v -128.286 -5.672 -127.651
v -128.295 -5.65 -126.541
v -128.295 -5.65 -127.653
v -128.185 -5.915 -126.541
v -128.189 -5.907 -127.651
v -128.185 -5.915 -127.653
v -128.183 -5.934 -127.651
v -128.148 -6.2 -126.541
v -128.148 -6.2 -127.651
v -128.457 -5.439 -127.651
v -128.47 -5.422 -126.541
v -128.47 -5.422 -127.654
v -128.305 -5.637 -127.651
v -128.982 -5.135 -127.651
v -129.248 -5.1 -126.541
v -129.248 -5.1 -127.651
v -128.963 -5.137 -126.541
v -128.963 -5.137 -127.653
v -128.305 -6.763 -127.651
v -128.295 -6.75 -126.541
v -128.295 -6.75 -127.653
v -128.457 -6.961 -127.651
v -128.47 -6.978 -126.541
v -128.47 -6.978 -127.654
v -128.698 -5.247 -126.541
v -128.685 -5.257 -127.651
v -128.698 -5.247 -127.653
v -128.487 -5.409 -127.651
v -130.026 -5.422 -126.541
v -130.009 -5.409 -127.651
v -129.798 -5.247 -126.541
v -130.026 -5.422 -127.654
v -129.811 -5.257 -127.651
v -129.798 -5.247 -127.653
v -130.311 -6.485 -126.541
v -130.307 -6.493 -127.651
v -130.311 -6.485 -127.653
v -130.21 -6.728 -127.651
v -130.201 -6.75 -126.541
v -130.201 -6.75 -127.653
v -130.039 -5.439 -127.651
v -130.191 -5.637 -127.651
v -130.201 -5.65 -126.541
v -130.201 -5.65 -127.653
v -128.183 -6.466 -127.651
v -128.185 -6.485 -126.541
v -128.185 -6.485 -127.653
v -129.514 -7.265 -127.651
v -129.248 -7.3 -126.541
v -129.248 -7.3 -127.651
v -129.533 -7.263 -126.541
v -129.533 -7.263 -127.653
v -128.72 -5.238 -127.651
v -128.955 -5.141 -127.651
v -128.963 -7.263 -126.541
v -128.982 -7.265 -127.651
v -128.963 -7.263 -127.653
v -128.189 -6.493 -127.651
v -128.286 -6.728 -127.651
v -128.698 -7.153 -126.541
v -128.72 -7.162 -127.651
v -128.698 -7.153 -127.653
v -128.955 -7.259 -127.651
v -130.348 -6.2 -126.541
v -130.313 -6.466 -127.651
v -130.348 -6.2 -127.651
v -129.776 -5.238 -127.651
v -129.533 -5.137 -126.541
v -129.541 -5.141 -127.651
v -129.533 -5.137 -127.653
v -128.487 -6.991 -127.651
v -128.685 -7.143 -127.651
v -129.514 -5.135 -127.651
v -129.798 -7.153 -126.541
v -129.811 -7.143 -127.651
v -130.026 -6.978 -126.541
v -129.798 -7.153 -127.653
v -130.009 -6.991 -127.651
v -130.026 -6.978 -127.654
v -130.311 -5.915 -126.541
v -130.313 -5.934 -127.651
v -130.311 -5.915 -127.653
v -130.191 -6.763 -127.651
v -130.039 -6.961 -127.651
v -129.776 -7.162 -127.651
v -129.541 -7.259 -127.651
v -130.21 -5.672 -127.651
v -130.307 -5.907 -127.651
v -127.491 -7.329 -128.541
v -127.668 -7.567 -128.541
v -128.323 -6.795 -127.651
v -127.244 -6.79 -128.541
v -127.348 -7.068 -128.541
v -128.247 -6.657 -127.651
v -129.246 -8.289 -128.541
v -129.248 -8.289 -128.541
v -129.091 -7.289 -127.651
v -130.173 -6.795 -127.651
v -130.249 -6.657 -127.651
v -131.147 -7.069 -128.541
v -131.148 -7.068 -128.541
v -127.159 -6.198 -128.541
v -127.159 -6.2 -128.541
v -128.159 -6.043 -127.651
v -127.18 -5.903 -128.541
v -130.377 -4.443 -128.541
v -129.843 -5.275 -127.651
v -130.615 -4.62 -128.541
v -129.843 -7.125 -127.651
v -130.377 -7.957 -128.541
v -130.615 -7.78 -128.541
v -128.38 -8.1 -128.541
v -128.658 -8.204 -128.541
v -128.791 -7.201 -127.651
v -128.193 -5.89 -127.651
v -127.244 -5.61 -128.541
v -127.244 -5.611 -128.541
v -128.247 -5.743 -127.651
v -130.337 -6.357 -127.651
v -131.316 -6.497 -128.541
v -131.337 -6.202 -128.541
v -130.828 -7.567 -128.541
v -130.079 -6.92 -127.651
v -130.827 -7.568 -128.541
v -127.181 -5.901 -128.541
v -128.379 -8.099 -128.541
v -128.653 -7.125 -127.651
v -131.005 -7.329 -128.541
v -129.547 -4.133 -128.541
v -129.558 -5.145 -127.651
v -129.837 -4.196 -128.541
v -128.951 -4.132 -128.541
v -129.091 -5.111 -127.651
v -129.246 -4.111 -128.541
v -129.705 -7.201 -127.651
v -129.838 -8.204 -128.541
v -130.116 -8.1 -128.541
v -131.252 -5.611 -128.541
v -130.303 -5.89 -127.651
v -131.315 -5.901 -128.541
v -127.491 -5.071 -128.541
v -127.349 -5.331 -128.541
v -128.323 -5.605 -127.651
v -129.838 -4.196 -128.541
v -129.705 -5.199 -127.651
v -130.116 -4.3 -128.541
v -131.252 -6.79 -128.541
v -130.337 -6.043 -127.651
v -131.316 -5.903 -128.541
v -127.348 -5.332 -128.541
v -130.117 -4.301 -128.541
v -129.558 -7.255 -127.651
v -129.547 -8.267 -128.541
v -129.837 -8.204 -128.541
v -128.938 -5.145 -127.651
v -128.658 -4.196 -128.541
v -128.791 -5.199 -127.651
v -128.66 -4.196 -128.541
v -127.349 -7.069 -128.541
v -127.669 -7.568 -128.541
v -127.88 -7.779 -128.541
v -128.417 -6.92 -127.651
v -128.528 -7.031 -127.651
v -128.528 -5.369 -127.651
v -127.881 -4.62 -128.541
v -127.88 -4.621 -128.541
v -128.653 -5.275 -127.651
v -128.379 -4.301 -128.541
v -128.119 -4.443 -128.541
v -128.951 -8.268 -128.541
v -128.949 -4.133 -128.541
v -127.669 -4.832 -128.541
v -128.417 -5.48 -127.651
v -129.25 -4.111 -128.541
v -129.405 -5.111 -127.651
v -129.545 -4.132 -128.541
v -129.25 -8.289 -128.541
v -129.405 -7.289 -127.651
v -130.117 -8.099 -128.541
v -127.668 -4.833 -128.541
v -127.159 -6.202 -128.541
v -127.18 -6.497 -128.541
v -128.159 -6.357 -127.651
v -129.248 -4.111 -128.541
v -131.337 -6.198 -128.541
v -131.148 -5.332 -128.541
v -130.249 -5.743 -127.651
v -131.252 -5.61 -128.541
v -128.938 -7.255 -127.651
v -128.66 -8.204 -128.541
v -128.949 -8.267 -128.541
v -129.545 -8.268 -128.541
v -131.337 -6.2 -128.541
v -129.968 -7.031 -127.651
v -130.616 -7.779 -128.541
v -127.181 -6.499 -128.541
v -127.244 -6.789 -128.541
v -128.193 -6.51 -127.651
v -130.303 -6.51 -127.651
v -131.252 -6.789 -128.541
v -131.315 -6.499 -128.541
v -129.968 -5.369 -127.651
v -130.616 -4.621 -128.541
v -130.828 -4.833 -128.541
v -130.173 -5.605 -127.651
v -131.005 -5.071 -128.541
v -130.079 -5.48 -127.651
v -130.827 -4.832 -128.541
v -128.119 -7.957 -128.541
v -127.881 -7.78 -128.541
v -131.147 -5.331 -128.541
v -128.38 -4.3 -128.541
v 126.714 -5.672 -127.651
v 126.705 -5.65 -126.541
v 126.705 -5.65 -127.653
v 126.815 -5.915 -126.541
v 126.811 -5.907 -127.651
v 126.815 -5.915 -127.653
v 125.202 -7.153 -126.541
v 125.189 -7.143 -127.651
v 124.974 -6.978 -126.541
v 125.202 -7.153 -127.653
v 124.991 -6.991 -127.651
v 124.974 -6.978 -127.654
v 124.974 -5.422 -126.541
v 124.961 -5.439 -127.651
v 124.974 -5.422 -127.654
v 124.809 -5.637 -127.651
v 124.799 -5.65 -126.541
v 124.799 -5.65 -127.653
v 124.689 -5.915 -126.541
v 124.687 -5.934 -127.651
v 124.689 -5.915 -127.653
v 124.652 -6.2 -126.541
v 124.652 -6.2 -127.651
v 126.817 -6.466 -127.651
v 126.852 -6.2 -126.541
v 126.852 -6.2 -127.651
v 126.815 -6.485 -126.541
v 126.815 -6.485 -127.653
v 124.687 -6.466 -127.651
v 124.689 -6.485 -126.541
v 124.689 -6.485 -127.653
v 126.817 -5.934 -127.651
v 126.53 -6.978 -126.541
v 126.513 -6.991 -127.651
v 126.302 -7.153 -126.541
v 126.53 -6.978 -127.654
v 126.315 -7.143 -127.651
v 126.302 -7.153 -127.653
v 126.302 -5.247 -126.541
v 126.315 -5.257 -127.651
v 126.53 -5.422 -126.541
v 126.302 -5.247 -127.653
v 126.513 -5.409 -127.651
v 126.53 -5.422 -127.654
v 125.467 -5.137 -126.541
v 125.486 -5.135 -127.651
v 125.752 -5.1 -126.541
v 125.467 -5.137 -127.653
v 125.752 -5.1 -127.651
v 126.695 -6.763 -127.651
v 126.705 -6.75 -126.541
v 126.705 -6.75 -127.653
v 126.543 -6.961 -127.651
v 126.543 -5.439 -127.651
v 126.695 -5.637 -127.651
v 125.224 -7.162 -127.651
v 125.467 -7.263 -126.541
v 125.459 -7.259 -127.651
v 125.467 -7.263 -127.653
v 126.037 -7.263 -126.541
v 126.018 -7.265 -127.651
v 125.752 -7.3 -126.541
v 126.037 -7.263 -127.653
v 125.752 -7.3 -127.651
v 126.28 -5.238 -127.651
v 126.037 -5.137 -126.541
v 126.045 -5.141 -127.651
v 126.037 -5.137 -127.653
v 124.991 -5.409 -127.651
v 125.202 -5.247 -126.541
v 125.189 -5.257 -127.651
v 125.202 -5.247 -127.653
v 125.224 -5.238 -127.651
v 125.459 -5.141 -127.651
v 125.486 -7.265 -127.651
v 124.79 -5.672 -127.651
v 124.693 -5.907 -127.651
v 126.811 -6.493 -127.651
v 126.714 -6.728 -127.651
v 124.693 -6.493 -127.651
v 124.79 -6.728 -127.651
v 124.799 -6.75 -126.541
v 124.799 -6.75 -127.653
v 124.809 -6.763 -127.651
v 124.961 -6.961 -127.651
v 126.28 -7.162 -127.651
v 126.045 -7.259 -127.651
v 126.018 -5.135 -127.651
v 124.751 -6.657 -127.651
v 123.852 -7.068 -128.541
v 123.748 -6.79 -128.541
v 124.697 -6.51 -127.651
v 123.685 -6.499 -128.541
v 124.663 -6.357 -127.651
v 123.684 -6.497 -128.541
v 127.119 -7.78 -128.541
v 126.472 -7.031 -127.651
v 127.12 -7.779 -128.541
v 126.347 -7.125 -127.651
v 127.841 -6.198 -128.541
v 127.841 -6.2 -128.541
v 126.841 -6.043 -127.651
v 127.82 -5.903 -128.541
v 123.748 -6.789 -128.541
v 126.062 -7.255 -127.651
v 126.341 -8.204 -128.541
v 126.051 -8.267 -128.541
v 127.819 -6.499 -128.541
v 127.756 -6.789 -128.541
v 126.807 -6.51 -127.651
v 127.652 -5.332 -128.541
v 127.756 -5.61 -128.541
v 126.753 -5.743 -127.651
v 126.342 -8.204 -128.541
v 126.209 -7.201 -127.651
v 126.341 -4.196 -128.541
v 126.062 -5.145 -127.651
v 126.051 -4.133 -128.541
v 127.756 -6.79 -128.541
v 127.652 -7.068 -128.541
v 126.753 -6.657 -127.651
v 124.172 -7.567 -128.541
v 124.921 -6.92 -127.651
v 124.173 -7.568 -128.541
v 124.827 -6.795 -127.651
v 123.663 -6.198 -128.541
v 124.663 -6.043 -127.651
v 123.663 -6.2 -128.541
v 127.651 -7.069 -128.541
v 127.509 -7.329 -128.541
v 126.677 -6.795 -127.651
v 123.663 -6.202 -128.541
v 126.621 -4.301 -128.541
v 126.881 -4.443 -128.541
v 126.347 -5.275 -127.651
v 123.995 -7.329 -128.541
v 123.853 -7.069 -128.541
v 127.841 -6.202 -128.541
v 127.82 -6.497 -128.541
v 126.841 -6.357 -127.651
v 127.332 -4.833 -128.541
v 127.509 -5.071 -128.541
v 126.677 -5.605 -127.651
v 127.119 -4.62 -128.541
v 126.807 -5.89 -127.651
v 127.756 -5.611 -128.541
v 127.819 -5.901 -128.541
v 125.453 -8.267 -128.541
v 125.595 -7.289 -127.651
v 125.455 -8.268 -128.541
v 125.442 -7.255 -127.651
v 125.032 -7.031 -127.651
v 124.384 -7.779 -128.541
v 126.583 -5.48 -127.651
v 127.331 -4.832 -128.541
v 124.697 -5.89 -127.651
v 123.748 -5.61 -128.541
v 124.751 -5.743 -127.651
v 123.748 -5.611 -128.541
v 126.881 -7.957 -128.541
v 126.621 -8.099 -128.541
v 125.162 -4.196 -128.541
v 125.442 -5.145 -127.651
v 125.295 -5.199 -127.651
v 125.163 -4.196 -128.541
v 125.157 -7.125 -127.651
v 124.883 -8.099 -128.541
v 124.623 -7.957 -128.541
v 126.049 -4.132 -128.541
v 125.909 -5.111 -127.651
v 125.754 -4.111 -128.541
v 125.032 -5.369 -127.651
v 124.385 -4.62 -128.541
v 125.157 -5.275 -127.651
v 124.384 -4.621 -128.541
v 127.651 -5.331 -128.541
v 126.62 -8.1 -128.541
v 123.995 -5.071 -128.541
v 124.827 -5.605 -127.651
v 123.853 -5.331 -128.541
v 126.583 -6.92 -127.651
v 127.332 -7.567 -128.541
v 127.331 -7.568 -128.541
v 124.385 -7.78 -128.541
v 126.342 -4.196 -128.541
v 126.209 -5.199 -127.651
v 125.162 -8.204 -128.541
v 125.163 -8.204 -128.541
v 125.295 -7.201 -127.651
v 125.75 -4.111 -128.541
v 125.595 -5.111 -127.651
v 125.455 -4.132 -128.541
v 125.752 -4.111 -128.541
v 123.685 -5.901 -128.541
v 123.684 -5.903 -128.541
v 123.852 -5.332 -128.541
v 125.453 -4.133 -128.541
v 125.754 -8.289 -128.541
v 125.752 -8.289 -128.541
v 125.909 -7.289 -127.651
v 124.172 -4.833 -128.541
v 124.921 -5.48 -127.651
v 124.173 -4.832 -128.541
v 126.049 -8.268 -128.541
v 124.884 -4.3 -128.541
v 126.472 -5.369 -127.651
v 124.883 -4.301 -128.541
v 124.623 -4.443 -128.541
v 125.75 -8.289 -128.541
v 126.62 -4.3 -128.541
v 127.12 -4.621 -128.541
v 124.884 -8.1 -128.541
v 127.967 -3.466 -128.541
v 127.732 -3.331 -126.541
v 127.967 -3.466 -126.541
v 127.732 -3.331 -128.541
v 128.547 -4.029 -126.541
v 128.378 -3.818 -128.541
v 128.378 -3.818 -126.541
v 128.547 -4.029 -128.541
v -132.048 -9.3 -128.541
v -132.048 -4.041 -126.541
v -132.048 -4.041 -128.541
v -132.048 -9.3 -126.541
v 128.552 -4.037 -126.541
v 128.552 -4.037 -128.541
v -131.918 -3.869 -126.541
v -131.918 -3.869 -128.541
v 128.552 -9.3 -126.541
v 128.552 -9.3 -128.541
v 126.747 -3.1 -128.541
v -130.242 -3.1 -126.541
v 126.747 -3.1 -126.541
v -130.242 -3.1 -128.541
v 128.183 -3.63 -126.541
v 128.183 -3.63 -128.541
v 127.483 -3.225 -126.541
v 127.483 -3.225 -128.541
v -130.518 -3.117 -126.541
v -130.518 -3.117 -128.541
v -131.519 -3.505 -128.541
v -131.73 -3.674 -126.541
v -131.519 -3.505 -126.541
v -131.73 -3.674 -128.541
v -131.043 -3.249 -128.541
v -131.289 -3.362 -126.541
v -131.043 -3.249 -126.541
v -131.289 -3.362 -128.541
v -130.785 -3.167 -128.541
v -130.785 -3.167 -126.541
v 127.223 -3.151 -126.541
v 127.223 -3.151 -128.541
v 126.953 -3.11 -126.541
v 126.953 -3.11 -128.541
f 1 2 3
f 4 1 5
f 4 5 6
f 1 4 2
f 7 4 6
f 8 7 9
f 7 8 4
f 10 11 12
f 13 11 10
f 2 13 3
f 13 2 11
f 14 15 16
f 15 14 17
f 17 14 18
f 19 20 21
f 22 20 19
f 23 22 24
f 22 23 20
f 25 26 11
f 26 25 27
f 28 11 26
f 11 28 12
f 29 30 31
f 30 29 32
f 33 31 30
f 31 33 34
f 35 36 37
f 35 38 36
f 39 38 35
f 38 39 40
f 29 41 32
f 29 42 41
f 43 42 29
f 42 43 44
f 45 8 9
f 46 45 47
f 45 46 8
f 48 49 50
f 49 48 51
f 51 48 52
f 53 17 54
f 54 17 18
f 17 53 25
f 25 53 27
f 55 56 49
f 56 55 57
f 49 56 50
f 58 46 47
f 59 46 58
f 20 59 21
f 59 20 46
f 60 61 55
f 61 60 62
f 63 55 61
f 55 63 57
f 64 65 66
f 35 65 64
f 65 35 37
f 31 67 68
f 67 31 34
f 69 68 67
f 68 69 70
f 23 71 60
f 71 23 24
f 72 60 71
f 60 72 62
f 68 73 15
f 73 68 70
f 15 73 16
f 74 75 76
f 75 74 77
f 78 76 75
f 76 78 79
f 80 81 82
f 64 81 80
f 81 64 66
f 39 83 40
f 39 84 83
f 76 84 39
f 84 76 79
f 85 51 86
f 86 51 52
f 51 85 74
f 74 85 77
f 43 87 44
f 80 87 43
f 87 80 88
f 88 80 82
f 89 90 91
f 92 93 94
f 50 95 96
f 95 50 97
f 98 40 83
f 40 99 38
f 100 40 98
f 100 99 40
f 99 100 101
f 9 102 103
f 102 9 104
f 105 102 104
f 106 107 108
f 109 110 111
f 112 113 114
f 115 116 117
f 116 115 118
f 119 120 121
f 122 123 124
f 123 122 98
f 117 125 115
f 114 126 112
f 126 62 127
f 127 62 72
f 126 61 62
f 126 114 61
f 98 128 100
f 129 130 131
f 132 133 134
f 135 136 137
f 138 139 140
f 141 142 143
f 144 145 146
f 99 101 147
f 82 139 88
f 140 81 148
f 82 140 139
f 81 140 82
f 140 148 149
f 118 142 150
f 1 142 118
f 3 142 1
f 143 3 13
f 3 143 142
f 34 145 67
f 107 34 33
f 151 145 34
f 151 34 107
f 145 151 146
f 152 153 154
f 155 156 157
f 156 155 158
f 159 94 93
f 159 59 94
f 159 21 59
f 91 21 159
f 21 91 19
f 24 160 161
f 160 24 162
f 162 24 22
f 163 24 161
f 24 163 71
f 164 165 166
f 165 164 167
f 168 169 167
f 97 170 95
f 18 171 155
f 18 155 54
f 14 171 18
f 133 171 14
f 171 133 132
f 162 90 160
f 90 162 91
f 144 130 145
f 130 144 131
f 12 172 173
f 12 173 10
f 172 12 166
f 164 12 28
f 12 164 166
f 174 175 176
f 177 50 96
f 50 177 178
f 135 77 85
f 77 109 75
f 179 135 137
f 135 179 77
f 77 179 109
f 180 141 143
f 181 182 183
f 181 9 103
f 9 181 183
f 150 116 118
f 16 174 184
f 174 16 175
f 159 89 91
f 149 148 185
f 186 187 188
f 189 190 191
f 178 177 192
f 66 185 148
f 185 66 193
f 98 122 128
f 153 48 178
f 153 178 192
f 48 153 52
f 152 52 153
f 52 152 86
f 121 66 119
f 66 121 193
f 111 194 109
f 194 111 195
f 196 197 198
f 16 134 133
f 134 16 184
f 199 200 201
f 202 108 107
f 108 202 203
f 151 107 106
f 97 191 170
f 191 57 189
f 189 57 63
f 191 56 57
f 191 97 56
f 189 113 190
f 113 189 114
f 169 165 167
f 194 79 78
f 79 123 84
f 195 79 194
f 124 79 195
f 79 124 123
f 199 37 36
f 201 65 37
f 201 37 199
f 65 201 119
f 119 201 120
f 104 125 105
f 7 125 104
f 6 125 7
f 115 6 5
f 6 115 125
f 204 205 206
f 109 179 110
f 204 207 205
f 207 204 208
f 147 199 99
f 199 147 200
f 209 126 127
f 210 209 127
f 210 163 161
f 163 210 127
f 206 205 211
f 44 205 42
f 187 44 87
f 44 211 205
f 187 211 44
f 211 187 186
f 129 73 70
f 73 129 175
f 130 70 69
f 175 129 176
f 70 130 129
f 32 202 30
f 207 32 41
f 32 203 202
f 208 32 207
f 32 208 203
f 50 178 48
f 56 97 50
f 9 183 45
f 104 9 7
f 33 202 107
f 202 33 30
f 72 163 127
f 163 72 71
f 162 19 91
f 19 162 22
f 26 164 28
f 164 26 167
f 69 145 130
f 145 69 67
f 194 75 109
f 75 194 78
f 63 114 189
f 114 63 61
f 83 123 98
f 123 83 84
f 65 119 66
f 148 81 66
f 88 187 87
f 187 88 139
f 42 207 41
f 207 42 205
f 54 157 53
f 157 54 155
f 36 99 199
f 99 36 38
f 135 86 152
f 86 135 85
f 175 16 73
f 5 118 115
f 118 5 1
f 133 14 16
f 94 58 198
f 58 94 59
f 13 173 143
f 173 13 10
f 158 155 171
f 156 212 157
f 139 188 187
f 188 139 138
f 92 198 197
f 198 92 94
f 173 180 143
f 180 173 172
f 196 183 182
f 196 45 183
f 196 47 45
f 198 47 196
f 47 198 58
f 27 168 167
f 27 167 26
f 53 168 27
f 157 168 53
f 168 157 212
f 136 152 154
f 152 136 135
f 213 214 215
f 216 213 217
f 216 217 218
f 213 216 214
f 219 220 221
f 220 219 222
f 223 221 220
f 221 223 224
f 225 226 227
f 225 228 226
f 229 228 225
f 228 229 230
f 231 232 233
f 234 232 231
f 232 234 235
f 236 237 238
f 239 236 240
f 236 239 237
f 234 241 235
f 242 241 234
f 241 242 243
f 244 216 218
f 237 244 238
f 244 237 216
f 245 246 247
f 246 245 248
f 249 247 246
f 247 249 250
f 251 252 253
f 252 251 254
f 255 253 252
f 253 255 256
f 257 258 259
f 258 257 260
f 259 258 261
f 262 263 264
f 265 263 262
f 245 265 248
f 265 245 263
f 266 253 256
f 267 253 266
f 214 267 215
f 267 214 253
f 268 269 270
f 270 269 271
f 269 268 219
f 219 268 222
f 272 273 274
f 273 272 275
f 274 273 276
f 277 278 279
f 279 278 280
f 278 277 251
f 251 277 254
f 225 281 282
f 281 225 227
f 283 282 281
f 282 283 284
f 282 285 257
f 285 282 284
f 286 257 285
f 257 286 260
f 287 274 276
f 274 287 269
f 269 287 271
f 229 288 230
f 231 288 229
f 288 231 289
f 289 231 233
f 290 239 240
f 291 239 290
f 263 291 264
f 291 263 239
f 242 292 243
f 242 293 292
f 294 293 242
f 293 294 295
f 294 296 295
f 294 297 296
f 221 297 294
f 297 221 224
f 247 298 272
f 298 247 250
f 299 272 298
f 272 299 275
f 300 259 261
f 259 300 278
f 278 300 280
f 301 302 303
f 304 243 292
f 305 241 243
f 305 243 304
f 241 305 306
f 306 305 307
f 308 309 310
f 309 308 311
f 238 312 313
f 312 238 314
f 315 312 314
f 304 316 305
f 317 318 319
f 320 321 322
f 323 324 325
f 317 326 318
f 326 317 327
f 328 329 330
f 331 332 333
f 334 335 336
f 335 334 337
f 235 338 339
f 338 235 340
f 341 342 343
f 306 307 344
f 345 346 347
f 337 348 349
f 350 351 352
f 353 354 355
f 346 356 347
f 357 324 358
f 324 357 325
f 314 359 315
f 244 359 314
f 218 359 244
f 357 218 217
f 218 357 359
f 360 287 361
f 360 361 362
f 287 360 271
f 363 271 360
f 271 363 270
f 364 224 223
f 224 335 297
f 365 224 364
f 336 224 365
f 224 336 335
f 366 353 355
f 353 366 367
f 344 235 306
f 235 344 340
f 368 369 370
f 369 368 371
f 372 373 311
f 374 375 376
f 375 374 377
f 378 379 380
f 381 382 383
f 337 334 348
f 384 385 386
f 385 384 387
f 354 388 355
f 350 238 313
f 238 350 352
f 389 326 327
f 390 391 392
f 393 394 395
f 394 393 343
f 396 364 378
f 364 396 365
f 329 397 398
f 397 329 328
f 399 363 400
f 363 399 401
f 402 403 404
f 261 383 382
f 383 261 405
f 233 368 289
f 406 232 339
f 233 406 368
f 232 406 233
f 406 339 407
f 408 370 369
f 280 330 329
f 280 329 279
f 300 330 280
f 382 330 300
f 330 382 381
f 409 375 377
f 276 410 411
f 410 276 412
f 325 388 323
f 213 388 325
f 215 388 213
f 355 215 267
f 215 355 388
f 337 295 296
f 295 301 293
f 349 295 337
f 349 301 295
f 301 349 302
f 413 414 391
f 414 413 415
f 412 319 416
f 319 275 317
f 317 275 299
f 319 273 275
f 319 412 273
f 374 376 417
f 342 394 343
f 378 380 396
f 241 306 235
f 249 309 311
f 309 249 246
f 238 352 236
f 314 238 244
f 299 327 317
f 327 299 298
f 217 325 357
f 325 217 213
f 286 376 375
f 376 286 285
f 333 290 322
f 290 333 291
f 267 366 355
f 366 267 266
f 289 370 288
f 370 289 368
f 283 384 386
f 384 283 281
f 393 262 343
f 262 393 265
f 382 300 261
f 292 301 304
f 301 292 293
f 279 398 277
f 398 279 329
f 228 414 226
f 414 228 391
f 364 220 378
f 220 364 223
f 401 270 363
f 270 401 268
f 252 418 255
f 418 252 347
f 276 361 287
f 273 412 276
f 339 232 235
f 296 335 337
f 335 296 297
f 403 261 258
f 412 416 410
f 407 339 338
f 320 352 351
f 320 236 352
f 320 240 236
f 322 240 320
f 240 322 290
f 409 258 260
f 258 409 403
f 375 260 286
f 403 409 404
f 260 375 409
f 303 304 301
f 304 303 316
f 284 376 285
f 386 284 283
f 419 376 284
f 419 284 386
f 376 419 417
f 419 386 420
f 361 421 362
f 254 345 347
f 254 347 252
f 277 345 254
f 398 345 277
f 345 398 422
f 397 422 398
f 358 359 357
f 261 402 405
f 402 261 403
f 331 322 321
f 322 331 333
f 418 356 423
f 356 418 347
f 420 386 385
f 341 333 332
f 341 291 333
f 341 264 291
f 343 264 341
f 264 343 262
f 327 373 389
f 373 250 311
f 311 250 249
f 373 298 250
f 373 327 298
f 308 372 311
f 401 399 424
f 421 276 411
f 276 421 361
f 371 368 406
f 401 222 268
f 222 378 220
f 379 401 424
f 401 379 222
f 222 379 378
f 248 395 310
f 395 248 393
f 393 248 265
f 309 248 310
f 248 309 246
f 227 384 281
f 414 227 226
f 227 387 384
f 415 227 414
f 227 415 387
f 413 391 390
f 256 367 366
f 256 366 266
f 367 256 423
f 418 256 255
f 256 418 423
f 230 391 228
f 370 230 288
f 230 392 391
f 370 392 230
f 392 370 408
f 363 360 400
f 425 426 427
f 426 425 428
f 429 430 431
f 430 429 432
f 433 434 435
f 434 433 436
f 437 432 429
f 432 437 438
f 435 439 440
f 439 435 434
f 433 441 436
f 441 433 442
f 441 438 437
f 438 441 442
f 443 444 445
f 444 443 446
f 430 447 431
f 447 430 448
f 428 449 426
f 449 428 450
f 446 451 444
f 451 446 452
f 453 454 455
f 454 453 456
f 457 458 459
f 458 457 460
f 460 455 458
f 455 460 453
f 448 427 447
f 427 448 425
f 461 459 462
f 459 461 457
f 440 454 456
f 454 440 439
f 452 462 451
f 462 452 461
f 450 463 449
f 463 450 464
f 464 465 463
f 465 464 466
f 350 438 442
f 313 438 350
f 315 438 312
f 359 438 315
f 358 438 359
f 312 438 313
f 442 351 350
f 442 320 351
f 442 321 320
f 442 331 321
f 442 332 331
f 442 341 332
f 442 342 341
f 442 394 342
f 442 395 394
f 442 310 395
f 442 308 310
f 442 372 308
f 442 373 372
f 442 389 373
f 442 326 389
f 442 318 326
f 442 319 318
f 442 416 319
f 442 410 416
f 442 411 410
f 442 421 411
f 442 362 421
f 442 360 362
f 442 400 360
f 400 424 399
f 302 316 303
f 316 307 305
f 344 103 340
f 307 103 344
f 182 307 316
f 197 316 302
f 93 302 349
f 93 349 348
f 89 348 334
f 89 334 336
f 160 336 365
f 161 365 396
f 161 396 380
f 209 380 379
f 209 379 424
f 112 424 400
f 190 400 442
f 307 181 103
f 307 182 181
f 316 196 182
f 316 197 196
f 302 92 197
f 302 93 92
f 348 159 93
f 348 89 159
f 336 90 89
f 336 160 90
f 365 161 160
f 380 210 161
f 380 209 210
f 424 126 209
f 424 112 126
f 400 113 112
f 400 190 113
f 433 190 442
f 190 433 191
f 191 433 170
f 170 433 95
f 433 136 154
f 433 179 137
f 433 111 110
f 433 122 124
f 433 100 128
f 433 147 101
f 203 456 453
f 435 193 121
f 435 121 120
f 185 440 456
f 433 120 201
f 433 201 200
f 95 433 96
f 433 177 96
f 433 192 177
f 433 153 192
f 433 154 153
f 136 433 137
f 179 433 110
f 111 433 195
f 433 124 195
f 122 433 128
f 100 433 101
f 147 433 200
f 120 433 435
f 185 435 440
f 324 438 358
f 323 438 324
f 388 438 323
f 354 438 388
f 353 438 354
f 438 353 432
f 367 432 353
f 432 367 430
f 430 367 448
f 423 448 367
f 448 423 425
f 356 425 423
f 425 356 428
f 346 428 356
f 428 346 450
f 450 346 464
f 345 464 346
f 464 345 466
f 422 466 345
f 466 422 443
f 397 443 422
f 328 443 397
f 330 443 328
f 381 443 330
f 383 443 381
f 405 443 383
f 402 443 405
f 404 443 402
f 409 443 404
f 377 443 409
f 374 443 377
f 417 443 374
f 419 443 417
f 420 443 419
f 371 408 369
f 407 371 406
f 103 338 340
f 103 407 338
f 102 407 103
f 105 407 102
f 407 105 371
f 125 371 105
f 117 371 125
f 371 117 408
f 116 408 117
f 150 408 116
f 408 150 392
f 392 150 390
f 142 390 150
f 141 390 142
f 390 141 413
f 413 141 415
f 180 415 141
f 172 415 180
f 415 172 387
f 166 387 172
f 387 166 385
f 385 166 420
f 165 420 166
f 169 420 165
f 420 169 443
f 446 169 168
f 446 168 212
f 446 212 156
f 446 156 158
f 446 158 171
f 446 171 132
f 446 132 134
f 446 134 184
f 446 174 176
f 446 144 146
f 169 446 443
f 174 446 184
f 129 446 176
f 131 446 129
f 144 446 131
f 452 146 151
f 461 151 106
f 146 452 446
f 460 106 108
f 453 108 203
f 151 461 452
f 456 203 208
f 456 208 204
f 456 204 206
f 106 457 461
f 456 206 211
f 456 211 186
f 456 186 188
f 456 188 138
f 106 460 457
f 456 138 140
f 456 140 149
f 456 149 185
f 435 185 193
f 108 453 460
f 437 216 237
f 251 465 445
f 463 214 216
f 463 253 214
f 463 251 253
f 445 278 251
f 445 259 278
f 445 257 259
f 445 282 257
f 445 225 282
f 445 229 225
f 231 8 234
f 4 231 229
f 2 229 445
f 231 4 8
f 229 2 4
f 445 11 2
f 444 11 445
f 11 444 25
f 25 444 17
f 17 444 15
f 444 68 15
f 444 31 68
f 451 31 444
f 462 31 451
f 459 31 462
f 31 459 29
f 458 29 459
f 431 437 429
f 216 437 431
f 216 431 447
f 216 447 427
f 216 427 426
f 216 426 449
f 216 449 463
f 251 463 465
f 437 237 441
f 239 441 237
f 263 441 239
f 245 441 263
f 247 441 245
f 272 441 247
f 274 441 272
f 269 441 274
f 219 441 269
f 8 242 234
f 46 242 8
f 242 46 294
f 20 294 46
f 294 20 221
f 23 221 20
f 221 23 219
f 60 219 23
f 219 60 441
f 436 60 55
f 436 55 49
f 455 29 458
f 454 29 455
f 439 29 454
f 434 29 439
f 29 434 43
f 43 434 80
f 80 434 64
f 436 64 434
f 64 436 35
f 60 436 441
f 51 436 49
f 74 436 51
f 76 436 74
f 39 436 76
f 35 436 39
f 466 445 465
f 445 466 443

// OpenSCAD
// file: layout.scad
// Bass: what all the bass's parts share. Taken from the example (ref/: the earlier
// BassCase) [given]: only the key arrangement and the hand plate's flat middle part.
//
// Frame: x along the rows, y from the hand plate towards the back, z up.

// --- keys: the example's arrangement
pitch    = 20;
rows_y   = [0, 16];              // front, back
rows_x0  = [-80, -70];           // first key of each row; 9 per row [given: 2 x 9]: the
n_row    = 9;                    //   example's 8 + 8, its half-closed front-left well and an added x = 90
cap_top  = [11, 21];             // cap tops at rest: the example's short and tall keys

// --- the discant's mechanism (switch/button.scad): the felt lands on a 1.2 cover on the board
cover_t  = 1.2;
pcb_t    = 1.6;
cu_t     = 0.035;
stroke   = 2.965;
cap_above = cover_t + stroke + 1 + 2;          // board top to cap top at rest: cover, stroke, felt, cap
board_top = [for (c = cap_top) c - cap_above]; // 3.835, 13.835: the back row 10 higher
board_z  = [for (t = board_top) t - cu_t - pcb_t / 2];
cover_top = [for (t = board_top) t + cover_t];

// --- the hand plate: the example's flat middle part, half as wide [given]
plate_w  = 263 / 2;
plate_y  = [-12.5, -9.5];        // the front wall, 3 thick; the hand presses on y = -12.5
plate_h  = 0.75 * (166 + cover_top[0]);   // the example's height (z -166 to the front cover) less 25 % [given]
plate_z  = [cover_top[0] - plate_h, cover_top[0]];   // flush with the front cover at the top

gap      = 0.1;                  // housing to the boards' undersides
fit      = 0.3;

// --- the boards: the discant's board sawn to 9 holes (pcb.scad, cut_holes = 4)
board_dx = [for (k = [0, 1]) rows_x0[k] + 120];   // hole 1 of 13 at x = -120: 40, 50
x_start  = -145.796;             // as pcb.scad
x_cut    = 52.3;
margin_n = 5.3;
margin_p = 9.4;
tab_x1   = -142.038;
tab_y    = 10.6;
screws   = [-142, -50, 50];      // per board, board frame, on the row line: M2 from the top

// --- the deck: the block behind the plate's top edge, as short in x as the boards
// allow [given]: their ends, fit, and a wall as the discant's cover
end_wall = 1.2;
deck_x   = [min([for (k = [0, 1]) x_start + board_dx[k]]) - fit - end_wall,
            max([for (k = [0, 1]) x_cut + board_dx[k]]) + fit + end_wall];
plate_x  = [(deck_x[0] + deck_x[1]) / 2 - plate_w / 2, (deck_x[0] + deck_x[1]) / 2 + plate_w / 2];   // centred on the deck
// the box below the deck: straight sides, wide enough to cover the discant's 46 keys
// (255 wide) when it is stored in the step [given: widen the box, keys covered]; it no
// longer tapers. box_x is centred on the deck, which keeps its width.
box_w    = 265;
box_x    = [(deck_x[0] + deck_x[1]) / 2 - box_w / 2, (deck_x[0] + deck_x[1]) / 2 + box_w / 2];
bottom_x = box_x;
// longer than the hand plate at the bottom: room for the stored discant's travel onto its
// short socket under the deck (link.scad): 3 [given: +3 mm], and 2.3 more for the
// socket's latch [given: latch in both positions]
box_ext  = 5.3;
z_bot    = plate_z[0] - box_ext;
// below the deck the box is thin [given: thinner, gauges in the step behind it]: from the
// hand's face to box_back; the deck above keeps its full depth, and behind the box,
// under the deck, is the step where the gauges sit. 11.2 [given: 4.8 thinner, so that
// the stored discant comes 4.8 closer]: front wall 3, a 6 mm battery with 0.3 each side,
// back wall back_t
box_depth = 11.2;
box_back  = plate_y[0] + box_depth;
back_t    = 1.6;
// to the back: 0.9 of wall behind the back board's tab; the stored discant's gauge pocket
// (link.scad) reaches y 24.65, 3.2 inside
deck_y   = [plate_y[1], 27.8];
riser_y  = 9.8;                  // front of the back step: 2.3 clear of the front caps [given: >= 2]
step_wall = 1.2;                 // the cover's wall up the step, one piece with both slabs [given]
step_y   = riser_y + step_wall;  // where the case's back block begins

function key_xy(k, i) = [rows_x0[k] + i * pitch, rows_y[k]];
function at_board(k) = [board_dx[k], rows_y[k], board_z[k]];
module board2d() union() {
    translate([x_start, -margin_n]) square([x_cut - x_start, margin_n + margin_p]);
    translate([x_start, 0]) square([tab_x1 - x_start, tab_y]);
}
// main file
// Bass lid: closes the box's open bottom (case.scad), flush with it, 0.2 inside the
// walls; two M2 countersunk screws into the case's bosses at its ends.
//
// make builds   openscad -o ../build/bass/lid.stl lid.scad

include <layout.scad>

wall = 2; corner_r = 4; lid_t = 2; boss_d = 7; clear = 0.2;
screw_d = 2.2; csk_d = 4.0;
$fa = 3; $fs = 0.3;

// the box's narrow, thin bottom (case.scad)
module footprint(d = 0) offset(r = corner_r - d) offset(delta = -corner_r)
    translate([bottom_x[0], plate_y[0]]) square([bottom_x[1] - bottom_x[0], box_back - plate_y[0]]);
module cavity2d() intersection() {   // as case.scad: side walls wall, back wall back_t
    footprint(back_t);
    translate([bottom_x[0] + wall, plate_y[1]]) square([bottom_x[1] - bottom_x[0] - 2 * wall, 100]);
}
function boss_xy() = [[bottom_x[0] + wall + boss_d / 2 - 0.5, (plate_y[1] + box_back - back_t) / 2],   // as case.scad
                      [bottom_x[1] - wall - boss_d / 2 + 0.5, (plate_y[1] + box_back - back_t) / 2]];

difference() {
    translate([0, 0, z_bot]) linear_extrude(lid_t) offset(delta = -clear) cavity2d();
    for (p = boss_xy()) translate([p[0], p[1], z_bot - 1]) {
        cylinder(d = screw_d, h = lid_t + 2);
        translate([0, 0, 1 - 0.01]) cylinder(d1 = csk_d + 0.2, d2 = screw_d, h = (csk_d - screw_d) / 2);
    }
}
